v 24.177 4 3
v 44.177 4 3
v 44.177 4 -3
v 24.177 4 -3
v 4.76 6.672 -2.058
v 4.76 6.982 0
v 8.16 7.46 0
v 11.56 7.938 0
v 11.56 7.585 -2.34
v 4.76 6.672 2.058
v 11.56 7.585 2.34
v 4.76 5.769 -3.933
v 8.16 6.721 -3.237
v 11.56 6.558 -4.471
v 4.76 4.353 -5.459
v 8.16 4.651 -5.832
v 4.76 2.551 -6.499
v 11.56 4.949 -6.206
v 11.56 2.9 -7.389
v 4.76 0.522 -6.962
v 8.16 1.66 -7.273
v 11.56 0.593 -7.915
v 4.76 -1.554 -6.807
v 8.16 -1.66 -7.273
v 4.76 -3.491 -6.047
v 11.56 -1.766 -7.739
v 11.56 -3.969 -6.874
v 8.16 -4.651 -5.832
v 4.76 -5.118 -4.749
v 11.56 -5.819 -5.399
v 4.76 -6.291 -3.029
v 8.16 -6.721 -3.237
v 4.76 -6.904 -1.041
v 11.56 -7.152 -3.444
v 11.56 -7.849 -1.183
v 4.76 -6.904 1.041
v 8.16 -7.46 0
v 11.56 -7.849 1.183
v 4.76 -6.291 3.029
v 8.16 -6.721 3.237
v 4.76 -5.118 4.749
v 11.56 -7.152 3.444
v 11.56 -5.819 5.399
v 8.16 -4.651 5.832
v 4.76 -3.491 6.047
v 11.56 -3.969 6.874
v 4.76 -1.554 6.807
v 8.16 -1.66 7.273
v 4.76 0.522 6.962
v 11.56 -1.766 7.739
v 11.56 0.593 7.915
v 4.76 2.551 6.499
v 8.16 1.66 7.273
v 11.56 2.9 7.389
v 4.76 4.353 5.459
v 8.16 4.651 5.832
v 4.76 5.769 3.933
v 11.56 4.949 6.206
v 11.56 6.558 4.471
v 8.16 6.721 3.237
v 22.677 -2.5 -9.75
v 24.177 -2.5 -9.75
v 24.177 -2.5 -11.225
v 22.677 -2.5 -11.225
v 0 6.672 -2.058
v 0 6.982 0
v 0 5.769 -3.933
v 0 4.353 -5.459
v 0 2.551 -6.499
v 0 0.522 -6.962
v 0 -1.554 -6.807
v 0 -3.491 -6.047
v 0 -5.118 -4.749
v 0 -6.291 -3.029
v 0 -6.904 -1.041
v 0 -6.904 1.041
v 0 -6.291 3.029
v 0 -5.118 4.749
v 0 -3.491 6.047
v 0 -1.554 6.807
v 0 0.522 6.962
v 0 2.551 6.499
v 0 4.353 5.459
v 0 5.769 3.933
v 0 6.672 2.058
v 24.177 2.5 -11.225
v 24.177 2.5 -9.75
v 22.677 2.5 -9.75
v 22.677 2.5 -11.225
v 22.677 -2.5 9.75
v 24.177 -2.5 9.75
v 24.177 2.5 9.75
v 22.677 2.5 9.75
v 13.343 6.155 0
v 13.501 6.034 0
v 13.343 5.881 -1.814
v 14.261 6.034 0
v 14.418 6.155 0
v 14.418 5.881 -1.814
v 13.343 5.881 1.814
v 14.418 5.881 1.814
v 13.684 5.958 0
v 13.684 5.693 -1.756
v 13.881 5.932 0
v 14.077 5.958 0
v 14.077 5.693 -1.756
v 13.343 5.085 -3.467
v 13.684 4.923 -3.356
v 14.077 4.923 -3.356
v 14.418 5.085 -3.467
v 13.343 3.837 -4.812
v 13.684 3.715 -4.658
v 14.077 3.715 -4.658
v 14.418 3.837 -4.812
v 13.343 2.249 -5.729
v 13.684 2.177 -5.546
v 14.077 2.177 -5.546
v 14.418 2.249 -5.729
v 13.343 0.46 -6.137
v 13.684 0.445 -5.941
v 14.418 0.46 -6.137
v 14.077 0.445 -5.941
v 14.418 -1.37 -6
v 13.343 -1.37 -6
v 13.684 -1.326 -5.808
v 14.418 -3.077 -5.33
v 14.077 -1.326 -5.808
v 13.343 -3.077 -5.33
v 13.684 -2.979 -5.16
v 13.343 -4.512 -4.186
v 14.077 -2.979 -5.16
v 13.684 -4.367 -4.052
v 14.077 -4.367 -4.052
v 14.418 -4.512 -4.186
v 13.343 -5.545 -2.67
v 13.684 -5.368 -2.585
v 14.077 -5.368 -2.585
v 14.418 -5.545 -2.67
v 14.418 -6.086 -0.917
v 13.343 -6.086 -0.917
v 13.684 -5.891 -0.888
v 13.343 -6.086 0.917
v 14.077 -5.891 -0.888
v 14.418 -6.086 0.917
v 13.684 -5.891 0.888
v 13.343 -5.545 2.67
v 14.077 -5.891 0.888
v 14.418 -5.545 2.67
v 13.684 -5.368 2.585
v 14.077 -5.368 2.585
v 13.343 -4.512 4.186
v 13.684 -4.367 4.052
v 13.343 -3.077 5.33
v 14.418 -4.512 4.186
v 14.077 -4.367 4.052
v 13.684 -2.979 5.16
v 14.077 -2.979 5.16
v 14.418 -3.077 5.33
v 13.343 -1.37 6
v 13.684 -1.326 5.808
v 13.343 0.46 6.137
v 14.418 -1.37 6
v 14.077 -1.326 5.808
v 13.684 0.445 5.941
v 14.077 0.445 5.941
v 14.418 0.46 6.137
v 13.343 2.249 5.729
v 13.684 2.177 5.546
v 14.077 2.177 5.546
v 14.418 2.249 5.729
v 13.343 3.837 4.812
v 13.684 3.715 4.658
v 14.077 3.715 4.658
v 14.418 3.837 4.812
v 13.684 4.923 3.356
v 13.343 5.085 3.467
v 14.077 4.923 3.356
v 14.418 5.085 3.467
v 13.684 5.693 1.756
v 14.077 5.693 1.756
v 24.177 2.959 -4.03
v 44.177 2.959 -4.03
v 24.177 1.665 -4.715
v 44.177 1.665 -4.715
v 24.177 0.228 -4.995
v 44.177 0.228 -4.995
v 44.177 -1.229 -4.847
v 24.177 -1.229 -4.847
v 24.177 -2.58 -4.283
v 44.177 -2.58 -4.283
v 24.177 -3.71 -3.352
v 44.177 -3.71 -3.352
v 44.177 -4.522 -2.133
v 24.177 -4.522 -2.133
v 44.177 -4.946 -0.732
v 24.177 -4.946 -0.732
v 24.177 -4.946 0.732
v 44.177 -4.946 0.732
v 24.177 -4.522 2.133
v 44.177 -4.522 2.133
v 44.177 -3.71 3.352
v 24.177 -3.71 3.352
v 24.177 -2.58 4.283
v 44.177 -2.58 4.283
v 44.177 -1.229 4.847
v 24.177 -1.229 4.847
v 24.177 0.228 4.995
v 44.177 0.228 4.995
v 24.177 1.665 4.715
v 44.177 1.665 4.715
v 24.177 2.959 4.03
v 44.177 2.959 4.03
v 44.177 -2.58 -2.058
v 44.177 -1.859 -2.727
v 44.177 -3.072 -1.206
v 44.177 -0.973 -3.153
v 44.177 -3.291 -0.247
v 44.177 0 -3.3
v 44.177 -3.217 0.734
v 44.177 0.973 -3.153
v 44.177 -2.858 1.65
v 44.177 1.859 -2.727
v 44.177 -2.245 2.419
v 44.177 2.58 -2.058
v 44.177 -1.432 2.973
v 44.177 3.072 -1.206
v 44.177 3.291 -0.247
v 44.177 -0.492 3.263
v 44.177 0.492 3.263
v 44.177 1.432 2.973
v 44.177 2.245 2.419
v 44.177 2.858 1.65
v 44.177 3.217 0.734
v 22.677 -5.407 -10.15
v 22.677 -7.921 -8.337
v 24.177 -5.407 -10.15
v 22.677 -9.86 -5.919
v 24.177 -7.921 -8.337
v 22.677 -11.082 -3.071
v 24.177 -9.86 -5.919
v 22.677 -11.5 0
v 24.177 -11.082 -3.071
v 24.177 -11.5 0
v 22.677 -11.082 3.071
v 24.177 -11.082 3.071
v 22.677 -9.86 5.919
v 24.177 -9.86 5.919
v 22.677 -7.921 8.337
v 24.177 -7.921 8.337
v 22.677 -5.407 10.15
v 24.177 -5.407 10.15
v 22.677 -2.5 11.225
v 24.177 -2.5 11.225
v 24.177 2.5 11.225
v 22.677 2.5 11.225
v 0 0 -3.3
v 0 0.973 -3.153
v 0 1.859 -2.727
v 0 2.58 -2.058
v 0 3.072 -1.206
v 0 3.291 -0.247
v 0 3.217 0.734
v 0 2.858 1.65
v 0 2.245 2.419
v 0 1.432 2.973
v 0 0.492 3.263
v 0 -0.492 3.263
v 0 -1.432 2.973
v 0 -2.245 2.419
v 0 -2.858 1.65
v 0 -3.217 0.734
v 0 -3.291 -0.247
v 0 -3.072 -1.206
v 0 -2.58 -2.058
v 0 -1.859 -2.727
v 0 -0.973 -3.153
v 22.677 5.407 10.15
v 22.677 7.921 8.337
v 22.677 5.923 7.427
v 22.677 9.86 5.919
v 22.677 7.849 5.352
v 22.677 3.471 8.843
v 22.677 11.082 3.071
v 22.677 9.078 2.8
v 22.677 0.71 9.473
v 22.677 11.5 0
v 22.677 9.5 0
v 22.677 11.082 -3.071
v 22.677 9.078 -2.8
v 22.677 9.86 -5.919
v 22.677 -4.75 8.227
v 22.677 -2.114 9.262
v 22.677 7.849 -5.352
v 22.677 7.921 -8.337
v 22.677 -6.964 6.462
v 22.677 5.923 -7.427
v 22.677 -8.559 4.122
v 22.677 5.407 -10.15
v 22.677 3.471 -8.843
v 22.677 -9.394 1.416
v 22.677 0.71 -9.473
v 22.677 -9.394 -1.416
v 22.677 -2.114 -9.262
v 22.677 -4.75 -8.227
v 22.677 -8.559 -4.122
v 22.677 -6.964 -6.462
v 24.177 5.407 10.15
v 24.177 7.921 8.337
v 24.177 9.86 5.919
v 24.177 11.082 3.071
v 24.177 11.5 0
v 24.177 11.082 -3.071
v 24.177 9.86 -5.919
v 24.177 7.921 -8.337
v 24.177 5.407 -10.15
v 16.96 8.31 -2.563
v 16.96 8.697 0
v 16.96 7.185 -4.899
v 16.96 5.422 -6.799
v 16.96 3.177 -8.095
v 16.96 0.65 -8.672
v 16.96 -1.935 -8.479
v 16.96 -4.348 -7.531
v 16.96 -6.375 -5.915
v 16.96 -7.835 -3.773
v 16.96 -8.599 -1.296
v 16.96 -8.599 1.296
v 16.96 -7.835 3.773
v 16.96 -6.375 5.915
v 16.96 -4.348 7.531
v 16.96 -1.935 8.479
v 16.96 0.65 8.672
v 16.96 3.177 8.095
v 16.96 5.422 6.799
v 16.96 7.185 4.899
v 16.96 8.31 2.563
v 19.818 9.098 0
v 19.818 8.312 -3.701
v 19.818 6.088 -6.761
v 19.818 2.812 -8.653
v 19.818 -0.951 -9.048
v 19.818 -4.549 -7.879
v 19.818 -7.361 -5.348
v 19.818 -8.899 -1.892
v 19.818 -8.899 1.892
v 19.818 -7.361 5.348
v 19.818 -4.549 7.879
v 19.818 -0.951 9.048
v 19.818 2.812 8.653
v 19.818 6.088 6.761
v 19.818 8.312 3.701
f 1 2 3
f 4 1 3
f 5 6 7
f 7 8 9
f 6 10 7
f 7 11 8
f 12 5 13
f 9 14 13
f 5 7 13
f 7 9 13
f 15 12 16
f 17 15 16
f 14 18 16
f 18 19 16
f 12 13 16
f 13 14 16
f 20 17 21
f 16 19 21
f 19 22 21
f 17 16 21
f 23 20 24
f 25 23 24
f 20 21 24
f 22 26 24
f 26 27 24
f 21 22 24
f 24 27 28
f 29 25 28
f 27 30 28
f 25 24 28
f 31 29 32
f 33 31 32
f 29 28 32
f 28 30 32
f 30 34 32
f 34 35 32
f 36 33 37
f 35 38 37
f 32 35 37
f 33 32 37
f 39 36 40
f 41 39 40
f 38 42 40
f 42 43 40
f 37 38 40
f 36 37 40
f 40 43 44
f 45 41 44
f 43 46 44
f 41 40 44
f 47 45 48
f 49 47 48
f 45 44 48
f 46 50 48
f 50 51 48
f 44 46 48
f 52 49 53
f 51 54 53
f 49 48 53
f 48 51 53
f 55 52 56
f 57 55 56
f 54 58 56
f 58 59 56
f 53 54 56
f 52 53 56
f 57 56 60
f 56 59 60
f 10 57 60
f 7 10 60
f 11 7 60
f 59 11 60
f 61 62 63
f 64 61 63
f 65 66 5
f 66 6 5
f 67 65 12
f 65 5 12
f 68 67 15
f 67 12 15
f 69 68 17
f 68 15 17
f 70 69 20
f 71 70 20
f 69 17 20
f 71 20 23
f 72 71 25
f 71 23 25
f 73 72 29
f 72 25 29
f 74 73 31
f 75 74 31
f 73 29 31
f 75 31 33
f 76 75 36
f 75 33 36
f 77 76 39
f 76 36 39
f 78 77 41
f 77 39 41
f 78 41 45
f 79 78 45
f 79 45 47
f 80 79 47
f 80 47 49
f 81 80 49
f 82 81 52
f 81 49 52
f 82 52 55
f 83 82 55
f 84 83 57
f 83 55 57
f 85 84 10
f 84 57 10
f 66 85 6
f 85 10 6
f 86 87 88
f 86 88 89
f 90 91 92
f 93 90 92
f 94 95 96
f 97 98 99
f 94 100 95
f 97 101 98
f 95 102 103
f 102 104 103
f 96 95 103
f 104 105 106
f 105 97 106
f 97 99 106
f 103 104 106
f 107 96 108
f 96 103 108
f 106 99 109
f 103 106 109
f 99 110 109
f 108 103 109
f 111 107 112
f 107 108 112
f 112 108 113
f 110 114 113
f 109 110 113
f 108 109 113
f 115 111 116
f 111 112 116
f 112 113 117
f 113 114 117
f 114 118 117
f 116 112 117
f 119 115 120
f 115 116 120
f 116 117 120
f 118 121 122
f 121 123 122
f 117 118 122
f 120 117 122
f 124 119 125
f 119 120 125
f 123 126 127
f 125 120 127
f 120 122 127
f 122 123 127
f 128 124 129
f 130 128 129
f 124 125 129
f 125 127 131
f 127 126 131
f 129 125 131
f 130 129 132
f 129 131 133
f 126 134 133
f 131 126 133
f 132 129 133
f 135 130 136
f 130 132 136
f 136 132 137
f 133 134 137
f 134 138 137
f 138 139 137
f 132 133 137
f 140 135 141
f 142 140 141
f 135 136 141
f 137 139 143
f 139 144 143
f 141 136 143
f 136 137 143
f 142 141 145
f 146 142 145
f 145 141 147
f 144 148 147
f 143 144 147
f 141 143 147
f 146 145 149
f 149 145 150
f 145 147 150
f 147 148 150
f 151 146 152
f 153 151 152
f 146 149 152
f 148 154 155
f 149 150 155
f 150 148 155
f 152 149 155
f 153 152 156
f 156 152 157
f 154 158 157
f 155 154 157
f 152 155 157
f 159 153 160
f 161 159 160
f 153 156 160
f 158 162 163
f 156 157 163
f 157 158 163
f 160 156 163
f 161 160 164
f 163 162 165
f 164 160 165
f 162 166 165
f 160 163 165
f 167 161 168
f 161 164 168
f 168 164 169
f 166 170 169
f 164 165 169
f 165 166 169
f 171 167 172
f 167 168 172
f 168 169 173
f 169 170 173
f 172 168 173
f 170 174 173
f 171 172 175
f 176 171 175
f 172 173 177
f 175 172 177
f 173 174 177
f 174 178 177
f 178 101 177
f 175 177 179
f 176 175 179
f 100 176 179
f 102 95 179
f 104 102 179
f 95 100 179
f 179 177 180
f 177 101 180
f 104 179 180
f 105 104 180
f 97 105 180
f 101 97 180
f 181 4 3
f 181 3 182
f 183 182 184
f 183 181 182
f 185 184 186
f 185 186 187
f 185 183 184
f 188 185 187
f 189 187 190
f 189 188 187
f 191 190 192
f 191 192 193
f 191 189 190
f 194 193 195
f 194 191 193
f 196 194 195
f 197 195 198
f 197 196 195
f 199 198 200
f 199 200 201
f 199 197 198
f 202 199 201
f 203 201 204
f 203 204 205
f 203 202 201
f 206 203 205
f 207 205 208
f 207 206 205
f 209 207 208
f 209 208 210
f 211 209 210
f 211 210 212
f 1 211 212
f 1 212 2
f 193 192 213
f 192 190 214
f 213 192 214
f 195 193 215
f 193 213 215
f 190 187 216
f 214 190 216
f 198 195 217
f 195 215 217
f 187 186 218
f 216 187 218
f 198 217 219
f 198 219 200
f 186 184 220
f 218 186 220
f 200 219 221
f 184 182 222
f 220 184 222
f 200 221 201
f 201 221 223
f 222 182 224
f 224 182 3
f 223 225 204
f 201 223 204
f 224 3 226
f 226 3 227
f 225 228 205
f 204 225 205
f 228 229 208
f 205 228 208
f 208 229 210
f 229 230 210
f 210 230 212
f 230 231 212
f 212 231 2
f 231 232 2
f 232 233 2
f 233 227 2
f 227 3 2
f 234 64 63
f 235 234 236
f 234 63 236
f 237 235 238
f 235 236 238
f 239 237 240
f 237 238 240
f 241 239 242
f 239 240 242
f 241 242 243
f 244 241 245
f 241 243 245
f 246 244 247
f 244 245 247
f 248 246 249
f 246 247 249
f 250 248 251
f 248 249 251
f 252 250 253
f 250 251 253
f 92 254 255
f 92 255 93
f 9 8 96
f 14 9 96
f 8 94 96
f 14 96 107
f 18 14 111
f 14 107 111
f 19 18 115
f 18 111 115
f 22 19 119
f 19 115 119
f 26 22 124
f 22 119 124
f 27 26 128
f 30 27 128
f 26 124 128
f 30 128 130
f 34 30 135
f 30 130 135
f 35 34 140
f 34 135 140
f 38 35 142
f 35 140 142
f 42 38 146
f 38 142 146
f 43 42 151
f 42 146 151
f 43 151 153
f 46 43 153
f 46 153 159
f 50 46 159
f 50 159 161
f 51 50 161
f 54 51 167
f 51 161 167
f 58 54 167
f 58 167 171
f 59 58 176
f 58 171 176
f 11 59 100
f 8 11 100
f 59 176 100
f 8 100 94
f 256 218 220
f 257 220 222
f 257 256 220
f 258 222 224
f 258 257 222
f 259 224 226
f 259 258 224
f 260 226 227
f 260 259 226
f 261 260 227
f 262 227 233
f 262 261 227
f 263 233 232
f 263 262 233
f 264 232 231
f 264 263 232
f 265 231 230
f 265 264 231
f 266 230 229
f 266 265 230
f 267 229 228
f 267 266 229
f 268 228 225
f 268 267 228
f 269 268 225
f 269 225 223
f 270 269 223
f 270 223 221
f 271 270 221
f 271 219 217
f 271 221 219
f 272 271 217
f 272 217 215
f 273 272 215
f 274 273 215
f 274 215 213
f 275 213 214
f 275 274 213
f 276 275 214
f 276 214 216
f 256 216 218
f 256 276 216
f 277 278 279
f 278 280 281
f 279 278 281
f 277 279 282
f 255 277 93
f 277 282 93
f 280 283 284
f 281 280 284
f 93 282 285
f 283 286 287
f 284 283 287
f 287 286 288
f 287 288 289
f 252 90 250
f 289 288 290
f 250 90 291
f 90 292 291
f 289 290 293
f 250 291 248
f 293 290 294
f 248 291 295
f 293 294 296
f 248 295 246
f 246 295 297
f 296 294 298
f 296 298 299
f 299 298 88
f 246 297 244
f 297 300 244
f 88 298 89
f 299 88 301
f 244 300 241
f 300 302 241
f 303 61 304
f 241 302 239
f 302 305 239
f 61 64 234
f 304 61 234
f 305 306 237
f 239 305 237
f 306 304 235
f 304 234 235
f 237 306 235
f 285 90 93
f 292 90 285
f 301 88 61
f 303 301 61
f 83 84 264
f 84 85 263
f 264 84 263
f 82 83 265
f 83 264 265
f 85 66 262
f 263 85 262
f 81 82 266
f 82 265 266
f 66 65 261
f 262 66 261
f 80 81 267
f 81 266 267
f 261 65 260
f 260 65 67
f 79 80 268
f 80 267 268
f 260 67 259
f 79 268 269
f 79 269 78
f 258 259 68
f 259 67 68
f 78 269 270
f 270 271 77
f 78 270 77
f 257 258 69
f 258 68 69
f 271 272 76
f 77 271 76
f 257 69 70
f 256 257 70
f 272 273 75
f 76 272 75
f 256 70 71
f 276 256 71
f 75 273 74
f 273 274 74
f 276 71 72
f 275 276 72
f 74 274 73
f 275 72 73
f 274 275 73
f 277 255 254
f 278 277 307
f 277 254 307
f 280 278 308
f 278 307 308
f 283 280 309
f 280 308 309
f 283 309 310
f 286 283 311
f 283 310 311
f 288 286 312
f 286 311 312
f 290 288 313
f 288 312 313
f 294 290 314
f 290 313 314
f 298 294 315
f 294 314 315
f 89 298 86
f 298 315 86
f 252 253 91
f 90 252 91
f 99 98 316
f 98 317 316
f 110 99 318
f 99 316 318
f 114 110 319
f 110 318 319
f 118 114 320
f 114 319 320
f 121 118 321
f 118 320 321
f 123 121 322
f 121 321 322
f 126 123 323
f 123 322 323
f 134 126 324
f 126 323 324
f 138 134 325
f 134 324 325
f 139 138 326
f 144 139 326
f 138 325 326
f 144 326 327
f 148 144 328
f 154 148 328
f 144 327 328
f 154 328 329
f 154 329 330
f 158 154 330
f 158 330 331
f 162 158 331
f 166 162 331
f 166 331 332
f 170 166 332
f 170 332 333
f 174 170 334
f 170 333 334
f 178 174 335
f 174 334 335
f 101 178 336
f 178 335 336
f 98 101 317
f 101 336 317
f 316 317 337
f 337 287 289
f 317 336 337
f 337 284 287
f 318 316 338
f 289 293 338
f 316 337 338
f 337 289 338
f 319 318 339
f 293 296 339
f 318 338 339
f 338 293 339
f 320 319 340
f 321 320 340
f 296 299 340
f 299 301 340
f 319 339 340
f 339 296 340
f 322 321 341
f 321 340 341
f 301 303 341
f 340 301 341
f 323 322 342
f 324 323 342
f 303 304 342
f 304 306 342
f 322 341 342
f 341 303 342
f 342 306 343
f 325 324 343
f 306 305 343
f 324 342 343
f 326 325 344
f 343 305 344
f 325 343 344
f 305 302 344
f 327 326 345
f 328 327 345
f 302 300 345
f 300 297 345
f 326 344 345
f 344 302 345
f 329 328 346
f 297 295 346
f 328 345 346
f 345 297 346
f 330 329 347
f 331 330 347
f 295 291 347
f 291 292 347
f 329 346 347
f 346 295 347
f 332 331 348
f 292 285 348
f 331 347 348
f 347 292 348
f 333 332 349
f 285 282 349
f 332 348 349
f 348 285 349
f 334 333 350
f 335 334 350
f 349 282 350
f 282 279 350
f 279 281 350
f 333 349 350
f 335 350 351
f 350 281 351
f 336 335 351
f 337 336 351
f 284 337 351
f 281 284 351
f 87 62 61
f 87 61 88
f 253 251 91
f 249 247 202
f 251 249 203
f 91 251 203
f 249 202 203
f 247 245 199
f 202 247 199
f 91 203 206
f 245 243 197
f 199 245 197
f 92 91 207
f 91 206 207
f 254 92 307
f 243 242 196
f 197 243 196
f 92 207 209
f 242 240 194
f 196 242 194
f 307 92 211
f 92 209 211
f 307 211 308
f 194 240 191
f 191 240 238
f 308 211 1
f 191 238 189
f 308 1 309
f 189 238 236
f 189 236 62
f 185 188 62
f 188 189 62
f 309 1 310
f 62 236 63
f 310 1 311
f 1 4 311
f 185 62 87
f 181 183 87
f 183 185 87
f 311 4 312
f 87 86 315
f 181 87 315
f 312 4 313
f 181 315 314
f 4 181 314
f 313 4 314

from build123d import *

# Parameters (mm, degrees)
SKETCH3_W           = 2
SKETCH3_H           = 5
CUT_EXTRUDE6_DEPTH  = 25.176500961
BOSS_EXTRUDE4_DEPTH = 20
SKETCH2_R           = 3.3
CUT_EXTRUDE7_DEPTH  = 45.176500961


with BuildPart() as part:
    # Sketch1 → Revolve3 (revolve)
    with BuildSketch(Plane.XY):
        with BuildLine():
            Line((0, 0), (0, 6.982))
            Line((0, 6.982), (4.76, 6.982))
            Line((4.76, 6.982), (11.56, 7.937677676))
            Line((11.56, 7.937677676), (13.343138593, 6.154539083))
            ThreePointArc((13.343138593, 6.154539083), (13.880539746, 5.931940237), (14.4179409, 6.154539083))
            Line((14.4179409, 6.154539083), (16.96, 8.696598183))
            Line((16.96, 8.696598183), (22.676500961, 9.5))
            Line((22.676500961, 9.5), (22.676500961, 11.5))
            Line((22.676500961, 11.5), (24.176500961, 11.5))
            Line((24.176500961, 11.5), (24.176500961, 0))
            Line((24.176500961, 0), (0, 0))
        make_face()
    revolve(axis=Axis((24.176500961, 0, 0), (-1, 0, 0)))

    # Sketch3 → Cut-Extrude6 (cut, through all)
    with BuildSketch(Plane(origin=(24.176500961, 0, 0), x_dir=(0, 0, -1), z_dir=(1, 0, 0))):
        with Locations((-10.75, 0)):
            Rectangle(SKETCH3_W, SKETCH3_H)
        with Locations((10.75, 0)):
            Rectangle(SKETCH3_W, SKETCH3_H)
    extrude(amount=-CUT_EXTRUDE6_DEPTH, mode=Mode.SUBTRACT)

    # Sketch4 → Boss-Extrude4 (add)
    with BuildSketch(Plane(origin=(24.176500961, 0, 0), x_dir=(0, 0, -1), z_dir=(1, 0, 0))):
        with BuildLine():
            Line((-3, 4), (3, 4))
            ThreePointArc((3, 4), (0, -5), (-3, 4))
        make_face()
    extrude(amount=BOSS_EXTRUDE4_DEPTH)

    # Sketch2 → Cut-Extrude7 (cut, through all)
    with BuildSketch(Plane(origin=(0, 0, 0), x_dir=(0, 0, -1), z_dir=(1, 0, 0))):
        Circle(SKETCH2_R)
    extrude(amount=CUT_EXTRUDE7_DEPTH, mode=Mode.SUBTRACT)


solid = part.part
